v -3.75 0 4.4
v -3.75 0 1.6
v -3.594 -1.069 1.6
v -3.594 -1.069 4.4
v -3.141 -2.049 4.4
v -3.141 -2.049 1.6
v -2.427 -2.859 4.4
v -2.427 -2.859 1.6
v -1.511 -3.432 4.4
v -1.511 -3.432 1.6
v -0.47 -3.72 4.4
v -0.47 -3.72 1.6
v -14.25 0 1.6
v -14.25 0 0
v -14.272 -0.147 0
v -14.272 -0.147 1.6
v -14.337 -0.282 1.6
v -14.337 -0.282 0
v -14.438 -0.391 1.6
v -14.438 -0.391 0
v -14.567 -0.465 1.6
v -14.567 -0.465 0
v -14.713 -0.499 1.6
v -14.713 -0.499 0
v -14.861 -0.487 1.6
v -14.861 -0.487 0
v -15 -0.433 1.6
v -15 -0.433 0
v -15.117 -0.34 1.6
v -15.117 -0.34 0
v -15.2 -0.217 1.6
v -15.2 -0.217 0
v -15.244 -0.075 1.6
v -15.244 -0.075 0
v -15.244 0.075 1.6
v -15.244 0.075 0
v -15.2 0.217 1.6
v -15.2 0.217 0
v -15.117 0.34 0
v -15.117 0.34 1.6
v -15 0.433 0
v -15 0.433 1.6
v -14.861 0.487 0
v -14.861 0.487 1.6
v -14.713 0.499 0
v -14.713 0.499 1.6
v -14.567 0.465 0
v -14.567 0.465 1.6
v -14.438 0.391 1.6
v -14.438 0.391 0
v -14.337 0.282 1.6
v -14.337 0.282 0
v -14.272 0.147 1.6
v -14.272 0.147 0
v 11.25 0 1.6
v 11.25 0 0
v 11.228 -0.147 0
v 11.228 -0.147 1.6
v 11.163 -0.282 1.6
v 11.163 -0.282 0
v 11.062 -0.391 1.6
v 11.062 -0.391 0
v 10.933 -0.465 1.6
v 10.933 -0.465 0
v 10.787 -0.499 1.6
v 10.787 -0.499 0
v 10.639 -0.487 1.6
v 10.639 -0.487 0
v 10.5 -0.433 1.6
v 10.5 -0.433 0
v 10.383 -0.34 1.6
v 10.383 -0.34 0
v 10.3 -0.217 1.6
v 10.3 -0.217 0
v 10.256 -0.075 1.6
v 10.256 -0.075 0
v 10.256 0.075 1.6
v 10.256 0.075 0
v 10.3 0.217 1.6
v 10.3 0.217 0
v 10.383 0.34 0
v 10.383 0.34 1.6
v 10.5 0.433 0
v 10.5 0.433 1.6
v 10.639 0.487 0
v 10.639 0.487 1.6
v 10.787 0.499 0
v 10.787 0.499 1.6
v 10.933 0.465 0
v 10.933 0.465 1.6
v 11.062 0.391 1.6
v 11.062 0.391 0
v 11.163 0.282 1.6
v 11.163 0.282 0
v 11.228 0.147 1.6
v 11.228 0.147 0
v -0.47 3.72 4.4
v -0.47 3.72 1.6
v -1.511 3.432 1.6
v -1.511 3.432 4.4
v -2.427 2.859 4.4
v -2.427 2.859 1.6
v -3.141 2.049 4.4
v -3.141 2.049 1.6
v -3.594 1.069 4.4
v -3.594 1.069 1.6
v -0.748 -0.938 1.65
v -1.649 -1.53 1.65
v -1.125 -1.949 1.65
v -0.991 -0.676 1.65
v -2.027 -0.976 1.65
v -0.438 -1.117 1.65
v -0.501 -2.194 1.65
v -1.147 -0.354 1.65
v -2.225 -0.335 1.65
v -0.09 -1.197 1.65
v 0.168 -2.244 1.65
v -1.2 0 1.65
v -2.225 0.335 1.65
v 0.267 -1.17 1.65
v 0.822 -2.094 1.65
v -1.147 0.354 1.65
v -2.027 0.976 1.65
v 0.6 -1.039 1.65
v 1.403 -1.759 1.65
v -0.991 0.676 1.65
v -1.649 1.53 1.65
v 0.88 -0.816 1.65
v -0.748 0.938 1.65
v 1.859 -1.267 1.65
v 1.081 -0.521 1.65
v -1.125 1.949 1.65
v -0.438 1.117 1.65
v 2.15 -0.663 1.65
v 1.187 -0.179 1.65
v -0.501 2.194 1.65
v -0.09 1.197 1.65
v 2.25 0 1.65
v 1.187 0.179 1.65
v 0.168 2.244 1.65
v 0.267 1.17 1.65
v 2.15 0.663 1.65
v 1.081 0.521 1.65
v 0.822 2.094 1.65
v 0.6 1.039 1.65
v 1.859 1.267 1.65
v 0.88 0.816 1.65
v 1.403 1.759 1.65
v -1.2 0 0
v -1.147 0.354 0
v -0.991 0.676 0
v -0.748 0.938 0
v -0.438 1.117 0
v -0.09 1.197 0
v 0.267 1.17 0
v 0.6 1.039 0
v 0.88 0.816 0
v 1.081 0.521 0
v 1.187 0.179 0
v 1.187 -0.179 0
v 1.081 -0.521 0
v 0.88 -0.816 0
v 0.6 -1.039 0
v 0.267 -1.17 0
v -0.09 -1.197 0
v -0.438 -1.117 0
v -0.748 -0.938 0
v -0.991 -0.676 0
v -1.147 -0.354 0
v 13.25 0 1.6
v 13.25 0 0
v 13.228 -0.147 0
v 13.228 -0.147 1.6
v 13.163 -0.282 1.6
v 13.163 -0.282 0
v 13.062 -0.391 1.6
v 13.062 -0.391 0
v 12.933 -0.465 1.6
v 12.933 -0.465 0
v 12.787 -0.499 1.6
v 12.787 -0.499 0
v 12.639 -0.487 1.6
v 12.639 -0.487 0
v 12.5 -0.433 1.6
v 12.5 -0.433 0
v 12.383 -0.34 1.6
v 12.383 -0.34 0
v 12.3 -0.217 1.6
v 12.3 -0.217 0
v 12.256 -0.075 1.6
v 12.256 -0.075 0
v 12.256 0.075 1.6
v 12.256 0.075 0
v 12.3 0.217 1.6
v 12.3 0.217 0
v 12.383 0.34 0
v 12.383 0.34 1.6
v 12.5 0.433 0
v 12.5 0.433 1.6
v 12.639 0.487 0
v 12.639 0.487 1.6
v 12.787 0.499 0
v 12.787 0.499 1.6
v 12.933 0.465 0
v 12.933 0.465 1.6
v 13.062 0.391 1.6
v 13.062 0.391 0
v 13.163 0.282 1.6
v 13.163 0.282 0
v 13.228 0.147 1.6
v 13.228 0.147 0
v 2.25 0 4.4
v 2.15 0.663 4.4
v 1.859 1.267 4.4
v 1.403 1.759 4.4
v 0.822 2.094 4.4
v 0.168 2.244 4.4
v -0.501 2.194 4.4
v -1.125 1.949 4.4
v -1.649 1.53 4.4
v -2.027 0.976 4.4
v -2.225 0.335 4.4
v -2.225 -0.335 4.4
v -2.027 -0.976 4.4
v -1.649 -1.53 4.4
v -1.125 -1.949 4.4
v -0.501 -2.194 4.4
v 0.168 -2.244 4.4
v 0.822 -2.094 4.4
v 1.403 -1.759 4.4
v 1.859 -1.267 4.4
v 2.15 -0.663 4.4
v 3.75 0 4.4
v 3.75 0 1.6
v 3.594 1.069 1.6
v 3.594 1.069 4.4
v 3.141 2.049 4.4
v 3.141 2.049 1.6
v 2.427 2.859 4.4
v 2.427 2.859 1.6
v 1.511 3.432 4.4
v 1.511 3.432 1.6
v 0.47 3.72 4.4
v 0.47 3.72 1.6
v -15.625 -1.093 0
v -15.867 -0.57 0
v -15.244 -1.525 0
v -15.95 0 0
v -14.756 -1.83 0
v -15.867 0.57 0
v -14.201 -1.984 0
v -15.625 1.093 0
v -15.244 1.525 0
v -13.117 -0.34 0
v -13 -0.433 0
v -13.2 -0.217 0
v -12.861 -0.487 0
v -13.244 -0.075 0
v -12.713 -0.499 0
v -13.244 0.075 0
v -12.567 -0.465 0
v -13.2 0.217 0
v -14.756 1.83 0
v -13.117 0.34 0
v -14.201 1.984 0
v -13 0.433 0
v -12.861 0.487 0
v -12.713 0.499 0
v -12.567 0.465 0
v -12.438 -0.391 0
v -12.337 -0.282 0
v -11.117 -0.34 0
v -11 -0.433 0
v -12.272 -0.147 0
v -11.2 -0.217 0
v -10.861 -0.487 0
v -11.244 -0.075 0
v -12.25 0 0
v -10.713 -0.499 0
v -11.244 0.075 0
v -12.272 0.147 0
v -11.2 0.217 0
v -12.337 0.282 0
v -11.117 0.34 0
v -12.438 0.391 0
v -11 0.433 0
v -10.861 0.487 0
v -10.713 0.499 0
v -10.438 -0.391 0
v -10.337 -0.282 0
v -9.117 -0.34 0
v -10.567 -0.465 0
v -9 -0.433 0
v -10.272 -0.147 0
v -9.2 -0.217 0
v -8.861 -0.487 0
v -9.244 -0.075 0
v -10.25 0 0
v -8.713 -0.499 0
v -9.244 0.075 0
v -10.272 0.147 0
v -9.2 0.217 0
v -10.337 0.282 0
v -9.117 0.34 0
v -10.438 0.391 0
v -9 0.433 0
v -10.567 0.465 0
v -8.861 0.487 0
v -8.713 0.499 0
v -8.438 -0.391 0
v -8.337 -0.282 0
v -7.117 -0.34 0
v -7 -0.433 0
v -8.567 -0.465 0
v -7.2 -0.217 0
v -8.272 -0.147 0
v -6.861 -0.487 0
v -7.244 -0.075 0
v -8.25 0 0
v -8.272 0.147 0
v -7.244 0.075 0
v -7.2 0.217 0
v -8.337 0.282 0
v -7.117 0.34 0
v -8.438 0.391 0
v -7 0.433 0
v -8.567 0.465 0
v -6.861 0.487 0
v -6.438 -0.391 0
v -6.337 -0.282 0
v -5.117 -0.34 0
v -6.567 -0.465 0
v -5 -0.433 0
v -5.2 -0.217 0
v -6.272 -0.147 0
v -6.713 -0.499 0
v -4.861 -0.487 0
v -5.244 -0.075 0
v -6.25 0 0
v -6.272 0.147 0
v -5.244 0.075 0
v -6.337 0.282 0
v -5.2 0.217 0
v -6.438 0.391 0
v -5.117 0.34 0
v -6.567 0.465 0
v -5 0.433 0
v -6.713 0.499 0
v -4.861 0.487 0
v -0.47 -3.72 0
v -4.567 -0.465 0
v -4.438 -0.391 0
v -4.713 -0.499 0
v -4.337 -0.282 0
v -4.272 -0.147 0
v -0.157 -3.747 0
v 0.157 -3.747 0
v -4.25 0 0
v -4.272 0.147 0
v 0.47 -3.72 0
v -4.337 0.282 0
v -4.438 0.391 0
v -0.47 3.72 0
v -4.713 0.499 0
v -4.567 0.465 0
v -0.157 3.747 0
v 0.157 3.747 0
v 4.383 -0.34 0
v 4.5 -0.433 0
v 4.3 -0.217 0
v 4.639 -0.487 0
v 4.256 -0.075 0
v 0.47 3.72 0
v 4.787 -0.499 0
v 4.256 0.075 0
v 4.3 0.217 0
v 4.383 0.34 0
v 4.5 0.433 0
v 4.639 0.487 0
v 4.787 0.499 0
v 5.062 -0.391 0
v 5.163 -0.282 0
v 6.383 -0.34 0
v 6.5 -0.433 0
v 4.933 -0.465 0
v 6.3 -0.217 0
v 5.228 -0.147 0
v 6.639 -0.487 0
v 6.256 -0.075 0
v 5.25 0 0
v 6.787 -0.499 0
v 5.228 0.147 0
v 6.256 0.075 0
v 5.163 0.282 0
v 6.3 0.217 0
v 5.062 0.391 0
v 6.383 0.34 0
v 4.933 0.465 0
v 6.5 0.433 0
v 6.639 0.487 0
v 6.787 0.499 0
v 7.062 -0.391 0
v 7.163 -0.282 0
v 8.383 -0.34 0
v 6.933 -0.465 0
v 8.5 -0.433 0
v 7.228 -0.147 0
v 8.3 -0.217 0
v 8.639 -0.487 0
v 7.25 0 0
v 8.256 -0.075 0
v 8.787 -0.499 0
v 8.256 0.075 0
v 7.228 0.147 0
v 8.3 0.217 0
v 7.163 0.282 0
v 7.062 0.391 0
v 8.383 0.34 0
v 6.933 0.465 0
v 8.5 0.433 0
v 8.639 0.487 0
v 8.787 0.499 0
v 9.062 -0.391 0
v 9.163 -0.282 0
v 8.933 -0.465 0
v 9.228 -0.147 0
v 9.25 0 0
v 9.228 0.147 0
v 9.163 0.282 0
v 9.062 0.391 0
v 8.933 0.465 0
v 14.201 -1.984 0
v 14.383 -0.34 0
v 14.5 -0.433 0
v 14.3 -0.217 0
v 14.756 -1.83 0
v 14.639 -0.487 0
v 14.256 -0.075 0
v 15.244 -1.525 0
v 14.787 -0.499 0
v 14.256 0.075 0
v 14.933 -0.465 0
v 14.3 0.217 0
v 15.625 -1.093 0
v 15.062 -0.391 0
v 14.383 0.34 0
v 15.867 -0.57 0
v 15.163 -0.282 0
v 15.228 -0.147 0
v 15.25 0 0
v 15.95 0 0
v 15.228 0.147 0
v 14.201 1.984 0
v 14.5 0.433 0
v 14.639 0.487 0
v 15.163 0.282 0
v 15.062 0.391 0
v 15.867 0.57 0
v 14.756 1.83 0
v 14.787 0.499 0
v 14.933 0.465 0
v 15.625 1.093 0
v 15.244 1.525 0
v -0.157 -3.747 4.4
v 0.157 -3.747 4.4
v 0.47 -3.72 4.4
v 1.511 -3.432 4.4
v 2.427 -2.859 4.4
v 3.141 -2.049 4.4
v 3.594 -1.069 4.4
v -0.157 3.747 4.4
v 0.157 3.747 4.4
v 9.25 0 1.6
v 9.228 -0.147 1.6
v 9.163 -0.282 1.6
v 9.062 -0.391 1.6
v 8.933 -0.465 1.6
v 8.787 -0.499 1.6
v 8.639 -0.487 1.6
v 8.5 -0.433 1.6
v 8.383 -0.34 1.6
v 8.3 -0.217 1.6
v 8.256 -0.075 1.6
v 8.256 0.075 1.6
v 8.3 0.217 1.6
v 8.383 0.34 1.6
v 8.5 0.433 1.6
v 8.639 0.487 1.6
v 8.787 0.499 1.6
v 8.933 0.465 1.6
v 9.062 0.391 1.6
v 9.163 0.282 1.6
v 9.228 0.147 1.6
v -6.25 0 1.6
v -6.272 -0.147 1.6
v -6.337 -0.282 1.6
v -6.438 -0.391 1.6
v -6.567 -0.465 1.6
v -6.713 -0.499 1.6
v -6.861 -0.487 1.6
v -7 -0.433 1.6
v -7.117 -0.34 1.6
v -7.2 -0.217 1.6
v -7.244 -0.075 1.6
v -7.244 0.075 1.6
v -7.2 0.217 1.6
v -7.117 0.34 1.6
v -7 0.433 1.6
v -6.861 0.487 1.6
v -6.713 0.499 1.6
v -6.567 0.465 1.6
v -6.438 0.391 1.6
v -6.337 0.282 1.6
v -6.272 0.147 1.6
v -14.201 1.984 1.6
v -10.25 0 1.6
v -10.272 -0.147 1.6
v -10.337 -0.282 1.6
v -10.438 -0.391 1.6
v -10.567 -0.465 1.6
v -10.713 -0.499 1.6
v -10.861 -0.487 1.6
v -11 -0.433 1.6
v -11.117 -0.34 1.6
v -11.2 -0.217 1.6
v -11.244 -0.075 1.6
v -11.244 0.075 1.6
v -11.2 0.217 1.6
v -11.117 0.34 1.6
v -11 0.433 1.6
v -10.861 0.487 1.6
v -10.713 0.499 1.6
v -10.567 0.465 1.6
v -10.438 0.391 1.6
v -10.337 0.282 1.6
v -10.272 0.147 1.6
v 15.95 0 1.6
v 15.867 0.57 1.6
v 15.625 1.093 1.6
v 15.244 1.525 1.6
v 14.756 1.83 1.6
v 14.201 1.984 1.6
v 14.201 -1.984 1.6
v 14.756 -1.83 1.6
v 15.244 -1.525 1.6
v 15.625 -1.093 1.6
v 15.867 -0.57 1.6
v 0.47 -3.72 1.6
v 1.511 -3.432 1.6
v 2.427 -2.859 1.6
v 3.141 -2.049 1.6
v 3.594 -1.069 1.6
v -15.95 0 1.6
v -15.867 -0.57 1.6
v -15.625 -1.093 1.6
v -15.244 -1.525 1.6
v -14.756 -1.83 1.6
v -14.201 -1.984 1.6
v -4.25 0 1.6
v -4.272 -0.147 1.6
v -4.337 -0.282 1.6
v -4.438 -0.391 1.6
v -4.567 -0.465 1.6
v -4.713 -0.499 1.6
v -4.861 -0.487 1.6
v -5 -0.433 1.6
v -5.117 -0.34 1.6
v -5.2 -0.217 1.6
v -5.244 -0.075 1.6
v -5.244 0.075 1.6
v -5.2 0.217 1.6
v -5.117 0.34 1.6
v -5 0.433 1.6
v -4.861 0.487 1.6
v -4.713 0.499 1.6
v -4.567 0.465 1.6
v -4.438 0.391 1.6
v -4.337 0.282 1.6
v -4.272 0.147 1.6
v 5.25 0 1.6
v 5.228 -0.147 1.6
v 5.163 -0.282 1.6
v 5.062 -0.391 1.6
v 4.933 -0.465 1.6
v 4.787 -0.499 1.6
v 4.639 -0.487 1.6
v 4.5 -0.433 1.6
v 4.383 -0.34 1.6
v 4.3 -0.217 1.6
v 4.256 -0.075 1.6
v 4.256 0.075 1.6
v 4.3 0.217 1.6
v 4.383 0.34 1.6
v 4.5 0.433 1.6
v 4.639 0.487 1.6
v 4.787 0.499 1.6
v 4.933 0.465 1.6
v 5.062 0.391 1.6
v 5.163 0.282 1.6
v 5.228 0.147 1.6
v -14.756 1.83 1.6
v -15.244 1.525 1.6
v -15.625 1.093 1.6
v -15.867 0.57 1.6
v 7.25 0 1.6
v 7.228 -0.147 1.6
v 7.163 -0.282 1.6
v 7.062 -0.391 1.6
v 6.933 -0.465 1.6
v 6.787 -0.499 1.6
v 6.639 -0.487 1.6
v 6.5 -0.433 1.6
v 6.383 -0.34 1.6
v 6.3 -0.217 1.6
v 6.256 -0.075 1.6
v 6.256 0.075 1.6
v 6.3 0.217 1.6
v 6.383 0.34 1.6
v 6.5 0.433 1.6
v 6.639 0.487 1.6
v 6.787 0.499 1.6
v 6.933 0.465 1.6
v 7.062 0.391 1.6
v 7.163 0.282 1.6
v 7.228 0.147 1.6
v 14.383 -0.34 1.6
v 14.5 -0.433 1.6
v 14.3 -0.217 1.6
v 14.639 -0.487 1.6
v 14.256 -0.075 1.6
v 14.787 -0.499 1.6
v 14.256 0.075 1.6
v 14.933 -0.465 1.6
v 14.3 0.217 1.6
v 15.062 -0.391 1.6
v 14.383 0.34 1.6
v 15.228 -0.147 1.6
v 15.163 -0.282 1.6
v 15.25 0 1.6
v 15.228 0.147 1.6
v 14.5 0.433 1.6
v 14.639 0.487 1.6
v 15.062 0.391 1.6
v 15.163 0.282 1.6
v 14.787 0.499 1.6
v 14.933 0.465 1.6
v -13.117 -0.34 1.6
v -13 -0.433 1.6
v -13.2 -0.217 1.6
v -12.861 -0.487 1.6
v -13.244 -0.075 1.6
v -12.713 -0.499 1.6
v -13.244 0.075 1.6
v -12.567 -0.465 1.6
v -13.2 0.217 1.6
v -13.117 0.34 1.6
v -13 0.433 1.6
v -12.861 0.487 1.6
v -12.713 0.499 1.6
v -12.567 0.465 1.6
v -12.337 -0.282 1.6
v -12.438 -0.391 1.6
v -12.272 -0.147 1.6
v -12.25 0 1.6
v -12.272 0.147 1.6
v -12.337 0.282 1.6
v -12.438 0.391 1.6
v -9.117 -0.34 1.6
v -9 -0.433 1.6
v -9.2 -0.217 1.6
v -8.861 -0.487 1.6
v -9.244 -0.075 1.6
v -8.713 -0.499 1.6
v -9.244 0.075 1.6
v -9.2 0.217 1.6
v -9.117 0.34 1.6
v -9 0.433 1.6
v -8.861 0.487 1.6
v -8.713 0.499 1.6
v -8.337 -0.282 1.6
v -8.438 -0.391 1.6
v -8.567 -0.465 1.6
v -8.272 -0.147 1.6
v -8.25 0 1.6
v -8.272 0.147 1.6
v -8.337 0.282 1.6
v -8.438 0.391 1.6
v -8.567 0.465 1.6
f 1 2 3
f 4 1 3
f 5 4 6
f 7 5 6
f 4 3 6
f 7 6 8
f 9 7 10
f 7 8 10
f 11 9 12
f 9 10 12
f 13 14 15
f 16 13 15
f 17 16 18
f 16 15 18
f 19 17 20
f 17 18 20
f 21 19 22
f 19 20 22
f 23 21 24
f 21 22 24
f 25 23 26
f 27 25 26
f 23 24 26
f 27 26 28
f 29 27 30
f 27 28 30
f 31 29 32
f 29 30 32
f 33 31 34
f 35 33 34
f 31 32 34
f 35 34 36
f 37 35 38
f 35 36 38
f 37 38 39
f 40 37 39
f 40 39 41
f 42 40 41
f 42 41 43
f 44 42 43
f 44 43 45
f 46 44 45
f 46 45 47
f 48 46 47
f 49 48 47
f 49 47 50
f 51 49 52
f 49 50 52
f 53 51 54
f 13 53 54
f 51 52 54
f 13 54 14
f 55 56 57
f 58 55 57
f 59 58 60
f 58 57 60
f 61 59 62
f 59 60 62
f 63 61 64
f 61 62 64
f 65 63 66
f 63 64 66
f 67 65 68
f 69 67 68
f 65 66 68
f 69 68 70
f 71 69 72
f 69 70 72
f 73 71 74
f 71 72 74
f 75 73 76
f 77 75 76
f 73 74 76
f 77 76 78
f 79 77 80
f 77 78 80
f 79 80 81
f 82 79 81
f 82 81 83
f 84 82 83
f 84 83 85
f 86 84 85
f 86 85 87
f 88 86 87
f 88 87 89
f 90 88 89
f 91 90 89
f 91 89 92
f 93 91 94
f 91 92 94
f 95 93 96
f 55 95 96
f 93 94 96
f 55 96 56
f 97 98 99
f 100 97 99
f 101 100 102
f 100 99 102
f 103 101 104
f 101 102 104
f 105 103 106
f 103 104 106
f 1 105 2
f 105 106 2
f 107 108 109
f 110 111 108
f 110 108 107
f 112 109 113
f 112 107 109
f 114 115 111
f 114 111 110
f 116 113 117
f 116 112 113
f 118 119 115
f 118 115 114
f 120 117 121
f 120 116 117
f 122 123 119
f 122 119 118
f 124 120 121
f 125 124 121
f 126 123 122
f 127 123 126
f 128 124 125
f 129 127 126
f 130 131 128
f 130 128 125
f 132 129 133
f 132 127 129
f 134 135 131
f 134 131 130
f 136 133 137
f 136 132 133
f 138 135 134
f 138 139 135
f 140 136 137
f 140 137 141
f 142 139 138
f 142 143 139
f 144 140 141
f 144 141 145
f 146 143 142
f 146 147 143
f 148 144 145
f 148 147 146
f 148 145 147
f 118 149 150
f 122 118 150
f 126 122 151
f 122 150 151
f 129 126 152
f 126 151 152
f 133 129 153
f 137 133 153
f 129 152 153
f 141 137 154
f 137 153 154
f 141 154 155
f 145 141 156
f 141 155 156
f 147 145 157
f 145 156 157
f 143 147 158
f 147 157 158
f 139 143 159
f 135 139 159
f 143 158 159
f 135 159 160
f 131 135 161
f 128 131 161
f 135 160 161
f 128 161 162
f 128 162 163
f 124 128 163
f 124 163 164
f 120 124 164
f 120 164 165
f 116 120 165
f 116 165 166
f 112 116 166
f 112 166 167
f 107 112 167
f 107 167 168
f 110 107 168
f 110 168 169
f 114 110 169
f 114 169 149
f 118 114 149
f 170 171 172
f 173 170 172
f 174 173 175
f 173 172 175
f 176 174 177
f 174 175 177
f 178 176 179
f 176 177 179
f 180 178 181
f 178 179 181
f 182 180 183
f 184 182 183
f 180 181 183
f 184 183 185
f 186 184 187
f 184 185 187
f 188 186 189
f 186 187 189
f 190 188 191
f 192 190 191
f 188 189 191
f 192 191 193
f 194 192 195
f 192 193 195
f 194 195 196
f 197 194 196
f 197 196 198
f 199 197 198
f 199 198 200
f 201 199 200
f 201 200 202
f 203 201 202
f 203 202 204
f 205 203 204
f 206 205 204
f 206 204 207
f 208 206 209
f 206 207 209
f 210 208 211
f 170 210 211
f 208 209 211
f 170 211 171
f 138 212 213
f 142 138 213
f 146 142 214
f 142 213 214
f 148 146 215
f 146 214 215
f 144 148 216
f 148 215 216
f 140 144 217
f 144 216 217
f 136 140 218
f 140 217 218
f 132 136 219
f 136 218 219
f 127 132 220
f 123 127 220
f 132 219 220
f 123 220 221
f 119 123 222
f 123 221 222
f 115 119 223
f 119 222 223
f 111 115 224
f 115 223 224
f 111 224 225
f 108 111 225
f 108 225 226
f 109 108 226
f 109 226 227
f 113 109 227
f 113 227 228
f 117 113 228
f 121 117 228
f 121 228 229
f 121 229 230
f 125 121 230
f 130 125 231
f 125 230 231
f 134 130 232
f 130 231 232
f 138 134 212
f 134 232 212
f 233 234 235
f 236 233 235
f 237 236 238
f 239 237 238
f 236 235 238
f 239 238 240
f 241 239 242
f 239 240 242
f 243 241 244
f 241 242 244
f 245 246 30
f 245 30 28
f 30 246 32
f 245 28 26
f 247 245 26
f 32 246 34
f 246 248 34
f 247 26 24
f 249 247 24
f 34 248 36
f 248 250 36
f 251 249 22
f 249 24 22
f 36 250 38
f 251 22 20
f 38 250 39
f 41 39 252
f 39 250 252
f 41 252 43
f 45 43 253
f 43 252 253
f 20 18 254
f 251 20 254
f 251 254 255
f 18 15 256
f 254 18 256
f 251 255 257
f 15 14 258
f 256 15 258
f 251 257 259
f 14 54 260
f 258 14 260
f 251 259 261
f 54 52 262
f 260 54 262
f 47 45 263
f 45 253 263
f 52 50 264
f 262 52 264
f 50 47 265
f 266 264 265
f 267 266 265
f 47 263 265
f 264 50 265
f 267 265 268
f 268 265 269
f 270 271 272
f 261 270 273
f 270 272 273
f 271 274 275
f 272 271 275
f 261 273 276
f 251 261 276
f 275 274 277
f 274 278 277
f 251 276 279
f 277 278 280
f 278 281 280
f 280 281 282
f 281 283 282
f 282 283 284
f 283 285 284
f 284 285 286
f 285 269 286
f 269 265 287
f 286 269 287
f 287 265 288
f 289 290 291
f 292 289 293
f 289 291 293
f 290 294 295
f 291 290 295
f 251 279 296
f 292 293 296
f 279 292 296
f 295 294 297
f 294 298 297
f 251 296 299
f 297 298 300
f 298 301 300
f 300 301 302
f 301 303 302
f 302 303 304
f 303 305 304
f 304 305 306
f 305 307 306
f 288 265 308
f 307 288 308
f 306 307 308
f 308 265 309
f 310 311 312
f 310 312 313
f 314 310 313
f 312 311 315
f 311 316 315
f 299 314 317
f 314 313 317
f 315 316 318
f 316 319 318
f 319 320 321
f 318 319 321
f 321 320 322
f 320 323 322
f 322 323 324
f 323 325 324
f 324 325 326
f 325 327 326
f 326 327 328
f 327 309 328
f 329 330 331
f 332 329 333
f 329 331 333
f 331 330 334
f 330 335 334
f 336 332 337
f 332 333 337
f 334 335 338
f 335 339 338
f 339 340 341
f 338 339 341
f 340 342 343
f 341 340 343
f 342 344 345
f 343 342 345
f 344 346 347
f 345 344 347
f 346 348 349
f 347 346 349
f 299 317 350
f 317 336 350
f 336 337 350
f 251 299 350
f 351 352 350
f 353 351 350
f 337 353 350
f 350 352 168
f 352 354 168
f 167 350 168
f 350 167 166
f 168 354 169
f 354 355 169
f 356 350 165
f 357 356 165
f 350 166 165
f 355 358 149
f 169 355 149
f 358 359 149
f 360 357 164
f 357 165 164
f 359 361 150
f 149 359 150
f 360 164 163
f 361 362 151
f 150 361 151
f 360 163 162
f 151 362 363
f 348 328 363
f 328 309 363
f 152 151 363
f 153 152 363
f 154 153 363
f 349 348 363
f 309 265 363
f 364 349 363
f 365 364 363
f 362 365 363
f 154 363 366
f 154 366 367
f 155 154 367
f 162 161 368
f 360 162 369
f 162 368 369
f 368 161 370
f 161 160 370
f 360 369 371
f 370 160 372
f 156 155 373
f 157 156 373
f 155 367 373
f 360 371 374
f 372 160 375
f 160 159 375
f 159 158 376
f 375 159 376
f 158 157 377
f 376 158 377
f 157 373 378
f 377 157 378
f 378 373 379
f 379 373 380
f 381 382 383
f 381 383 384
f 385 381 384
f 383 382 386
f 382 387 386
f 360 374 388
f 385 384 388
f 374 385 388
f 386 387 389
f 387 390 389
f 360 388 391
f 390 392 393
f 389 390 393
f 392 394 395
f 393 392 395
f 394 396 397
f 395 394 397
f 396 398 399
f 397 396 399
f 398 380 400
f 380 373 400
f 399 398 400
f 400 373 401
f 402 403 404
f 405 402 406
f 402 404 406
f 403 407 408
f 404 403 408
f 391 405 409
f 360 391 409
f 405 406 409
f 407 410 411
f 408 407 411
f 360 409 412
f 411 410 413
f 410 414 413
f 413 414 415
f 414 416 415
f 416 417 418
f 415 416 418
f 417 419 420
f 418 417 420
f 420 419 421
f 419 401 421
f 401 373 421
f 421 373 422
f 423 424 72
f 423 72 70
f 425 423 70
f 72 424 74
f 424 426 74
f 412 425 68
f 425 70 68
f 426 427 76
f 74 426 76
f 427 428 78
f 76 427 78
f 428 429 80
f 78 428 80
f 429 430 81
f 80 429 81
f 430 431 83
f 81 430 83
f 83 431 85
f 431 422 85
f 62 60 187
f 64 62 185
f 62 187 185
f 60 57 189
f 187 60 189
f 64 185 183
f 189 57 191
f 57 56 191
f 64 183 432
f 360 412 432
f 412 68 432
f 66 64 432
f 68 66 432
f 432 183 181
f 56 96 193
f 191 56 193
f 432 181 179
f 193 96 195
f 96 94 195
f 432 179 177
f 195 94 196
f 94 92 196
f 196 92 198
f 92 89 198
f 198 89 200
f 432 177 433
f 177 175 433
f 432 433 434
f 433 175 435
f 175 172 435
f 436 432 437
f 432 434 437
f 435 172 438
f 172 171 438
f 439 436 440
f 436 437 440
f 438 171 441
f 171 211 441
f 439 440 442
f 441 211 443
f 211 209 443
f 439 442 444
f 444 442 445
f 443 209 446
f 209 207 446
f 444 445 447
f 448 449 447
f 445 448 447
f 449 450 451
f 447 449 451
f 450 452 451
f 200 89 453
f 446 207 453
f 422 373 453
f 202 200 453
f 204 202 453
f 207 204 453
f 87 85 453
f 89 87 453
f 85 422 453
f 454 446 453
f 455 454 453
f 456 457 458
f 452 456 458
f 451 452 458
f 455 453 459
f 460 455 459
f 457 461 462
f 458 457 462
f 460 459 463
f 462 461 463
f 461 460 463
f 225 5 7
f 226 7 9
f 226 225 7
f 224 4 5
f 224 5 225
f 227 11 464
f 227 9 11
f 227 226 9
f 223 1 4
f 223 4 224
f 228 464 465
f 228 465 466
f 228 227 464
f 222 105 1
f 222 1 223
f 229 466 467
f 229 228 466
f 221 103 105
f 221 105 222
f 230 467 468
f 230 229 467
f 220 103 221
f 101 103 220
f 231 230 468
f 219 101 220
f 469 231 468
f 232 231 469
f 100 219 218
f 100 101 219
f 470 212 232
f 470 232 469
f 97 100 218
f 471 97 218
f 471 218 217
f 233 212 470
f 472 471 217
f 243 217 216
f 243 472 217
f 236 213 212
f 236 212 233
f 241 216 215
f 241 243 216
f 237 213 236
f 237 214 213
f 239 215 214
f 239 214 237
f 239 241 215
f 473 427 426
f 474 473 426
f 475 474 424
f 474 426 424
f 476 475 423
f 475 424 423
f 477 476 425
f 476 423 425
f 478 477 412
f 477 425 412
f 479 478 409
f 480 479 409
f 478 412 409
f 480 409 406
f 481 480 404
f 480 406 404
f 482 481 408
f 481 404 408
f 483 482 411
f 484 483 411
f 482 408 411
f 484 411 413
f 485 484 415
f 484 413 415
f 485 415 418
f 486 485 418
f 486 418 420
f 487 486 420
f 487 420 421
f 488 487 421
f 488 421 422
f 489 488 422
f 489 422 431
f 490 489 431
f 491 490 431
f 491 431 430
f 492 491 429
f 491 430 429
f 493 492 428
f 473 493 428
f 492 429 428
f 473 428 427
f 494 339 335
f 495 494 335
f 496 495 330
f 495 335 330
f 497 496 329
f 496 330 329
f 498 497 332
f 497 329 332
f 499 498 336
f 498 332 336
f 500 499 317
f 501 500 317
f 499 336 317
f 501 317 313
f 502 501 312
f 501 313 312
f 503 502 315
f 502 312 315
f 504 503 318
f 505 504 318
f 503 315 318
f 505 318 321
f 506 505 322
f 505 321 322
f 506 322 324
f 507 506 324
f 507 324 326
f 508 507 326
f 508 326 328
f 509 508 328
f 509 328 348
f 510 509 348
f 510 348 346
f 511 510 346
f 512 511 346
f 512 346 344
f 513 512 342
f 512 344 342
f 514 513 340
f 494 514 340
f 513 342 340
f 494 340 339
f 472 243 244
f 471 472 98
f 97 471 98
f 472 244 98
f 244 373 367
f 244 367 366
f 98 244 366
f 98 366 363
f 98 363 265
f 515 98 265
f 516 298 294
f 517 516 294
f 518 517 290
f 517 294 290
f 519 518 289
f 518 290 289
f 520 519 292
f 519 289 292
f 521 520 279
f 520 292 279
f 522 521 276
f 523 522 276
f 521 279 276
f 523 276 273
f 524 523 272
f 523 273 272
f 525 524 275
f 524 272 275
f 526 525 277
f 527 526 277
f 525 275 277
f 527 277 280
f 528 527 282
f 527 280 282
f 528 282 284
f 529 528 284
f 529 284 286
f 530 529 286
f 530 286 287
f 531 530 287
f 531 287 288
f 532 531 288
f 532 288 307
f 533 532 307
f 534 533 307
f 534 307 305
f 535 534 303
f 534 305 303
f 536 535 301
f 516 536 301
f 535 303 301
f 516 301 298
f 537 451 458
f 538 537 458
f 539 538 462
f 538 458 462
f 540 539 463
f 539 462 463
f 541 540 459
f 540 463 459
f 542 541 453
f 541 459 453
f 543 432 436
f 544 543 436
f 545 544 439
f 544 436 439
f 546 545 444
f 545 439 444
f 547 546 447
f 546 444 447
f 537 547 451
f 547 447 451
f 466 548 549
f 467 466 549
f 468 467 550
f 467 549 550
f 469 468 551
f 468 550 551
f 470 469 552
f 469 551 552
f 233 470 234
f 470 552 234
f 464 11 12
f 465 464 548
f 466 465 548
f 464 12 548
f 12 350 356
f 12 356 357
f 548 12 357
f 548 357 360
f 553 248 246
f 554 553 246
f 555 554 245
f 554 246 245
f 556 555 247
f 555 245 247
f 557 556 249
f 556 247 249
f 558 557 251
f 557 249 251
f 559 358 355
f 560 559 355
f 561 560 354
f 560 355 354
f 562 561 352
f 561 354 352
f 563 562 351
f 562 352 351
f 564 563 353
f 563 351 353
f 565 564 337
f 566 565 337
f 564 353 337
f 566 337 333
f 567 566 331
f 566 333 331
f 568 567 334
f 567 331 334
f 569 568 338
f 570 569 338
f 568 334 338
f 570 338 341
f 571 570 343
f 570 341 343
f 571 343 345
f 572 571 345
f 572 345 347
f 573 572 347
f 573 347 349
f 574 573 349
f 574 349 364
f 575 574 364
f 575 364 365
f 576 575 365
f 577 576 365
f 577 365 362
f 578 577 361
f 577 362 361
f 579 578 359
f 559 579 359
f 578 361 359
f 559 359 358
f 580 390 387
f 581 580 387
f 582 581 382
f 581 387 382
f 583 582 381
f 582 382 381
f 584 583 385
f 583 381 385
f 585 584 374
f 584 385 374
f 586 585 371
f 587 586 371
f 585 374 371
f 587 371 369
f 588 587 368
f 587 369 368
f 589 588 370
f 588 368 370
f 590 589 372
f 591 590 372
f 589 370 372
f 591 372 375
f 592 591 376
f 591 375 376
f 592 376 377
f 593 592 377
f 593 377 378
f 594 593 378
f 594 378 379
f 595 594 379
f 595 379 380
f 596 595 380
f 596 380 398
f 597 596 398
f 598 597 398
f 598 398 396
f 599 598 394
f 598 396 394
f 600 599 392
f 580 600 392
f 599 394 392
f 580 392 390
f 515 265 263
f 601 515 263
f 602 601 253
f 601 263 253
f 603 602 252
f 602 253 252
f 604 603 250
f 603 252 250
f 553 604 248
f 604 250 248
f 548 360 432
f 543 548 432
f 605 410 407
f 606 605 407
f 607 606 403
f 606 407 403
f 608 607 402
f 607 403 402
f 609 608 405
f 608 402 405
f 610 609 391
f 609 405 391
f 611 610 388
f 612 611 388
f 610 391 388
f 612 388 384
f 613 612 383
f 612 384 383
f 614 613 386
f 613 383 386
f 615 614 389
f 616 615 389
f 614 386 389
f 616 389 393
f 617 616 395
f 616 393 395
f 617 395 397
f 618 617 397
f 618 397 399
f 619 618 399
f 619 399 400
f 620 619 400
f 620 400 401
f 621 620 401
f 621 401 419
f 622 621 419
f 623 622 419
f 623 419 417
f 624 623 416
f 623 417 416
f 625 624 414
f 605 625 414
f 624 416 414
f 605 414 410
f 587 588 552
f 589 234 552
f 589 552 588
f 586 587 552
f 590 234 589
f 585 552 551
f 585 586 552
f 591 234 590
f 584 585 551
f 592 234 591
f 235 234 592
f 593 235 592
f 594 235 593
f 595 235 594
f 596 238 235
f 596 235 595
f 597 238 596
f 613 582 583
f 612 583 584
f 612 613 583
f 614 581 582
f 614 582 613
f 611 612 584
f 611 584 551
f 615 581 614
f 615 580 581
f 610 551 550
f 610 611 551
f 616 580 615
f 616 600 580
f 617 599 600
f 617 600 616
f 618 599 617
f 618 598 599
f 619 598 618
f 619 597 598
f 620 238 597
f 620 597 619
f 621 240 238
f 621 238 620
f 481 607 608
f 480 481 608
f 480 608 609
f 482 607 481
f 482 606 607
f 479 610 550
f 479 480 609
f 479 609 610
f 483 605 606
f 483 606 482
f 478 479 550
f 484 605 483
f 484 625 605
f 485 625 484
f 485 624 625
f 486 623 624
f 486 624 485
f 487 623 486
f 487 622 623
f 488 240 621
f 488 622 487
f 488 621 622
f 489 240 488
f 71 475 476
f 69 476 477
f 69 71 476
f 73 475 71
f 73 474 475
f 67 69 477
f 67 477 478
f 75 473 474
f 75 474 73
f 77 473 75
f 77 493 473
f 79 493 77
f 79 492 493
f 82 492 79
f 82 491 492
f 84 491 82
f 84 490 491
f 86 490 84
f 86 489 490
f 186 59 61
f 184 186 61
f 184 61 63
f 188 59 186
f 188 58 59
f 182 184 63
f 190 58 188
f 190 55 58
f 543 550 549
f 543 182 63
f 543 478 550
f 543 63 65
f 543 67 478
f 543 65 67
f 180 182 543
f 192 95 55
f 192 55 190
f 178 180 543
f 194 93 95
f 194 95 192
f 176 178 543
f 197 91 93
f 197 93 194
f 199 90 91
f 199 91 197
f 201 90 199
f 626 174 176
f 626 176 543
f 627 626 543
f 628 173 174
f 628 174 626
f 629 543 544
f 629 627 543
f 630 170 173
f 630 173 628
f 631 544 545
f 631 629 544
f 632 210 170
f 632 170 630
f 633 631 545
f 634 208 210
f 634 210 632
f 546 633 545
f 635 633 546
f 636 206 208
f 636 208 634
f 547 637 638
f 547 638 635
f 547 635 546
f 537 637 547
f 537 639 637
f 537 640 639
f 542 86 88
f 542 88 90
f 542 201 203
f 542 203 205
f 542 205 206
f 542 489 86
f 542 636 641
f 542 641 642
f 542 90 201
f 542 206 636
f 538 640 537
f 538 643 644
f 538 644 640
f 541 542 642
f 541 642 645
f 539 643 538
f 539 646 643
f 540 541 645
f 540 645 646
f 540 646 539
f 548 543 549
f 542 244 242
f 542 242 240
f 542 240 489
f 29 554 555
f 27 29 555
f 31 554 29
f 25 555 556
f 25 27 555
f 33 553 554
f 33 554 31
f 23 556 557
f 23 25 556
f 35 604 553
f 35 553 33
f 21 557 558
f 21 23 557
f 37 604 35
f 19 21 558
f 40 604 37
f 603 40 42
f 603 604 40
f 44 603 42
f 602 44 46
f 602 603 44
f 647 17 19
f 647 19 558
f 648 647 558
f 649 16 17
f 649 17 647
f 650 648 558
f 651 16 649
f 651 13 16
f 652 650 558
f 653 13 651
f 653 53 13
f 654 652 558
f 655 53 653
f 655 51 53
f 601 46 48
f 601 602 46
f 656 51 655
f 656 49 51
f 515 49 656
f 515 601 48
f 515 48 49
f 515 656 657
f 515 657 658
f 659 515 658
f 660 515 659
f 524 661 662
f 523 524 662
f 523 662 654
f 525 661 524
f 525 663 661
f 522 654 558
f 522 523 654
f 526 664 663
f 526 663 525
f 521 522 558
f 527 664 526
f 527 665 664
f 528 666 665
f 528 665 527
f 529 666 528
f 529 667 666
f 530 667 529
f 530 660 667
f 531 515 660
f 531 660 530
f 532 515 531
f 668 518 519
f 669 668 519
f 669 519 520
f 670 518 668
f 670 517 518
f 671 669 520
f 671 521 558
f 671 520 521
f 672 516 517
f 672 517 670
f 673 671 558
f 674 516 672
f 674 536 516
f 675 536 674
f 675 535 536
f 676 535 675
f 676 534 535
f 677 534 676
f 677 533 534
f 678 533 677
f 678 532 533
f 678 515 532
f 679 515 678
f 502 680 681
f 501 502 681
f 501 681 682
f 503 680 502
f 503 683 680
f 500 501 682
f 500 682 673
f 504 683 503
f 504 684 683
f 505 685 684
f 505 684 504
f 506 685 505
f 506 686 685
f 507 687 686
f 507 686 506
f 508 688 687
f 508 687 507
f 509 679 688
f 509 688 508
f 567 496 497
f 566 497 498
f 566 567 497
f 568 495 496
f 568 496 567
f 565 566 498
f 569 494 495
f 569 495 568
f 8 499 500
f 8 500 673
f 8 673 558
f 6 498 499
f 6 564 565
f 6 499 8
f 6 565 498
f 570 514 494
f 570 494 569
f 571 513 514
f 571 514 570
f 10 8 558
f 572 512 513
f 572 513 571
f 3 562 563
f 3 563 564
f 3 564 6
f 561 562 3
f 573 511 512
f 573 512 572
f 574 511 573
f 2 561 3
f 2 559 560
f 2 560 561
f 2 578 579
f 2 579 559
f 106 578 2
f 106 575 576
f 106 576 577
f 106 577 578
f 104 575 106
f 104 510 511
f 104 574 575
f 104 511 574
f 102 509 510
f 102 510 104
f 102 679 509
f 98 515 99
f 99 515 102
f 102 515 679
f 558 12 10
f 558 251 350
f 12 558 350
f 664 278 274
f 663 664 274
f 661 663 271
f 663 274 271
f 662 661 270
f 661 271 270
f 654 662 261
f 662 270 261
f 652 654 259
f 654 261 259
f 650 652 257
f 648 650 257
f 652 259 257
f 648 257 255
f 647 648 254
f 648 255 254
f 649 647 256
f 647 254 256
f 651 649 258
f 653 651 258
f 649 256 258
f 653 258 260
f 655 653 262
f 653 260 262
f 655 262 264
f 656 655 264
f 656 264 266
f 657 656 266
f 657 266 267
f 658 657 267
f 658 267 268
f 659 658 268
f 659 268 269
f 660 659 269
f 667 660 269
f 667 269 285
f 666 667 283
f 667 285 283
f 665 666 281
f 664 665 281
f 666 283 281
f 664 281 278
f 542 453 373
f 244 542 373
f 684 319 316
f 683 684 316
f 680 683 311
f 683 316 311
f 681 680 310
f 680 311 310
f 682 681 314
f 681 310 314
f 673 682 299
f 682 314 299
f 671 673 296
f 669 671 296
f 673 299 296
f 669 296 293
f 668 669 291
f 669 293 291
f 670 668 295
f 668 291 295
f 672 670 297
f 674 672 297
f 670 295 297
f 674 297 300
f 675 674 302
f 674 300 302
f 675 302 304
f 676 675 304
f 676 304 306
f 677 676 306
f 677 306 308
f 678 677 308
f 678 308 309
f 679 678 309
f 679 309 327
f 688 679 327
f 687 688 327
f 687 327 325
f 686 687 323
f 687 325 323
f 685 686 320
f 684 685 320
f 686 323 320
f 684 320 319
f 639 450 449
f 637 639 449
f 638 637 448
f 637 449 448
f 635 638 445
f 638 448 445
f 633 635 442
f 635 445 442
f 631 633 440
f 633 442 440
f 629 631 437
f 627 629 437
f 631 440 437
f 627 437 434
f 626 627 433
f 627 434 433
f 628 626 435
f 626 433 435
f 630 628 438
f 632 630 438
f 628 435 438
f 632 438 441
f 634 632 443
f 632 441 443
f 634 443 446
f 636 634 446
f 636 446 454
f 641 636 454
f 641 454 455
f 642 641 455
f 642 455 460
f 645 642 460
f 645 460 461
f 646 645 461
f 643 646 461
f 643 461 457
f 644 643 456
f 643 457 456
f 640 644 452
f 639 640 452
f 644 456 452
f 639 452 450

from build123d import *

# Parameters (mm, degrees)
SKETCH1_R             = 0.5
BOSS_EXTRUDE1_DEPTH   = 1.6
BOSS_EXTRUDE1_2_DEPTH = 1.6
SKETCH1_4_R           = 3.75
SKETCH1_4_R_2         = 1.2
BOSS_EXTRUDE2_DEPTH   = 4.4
SKETCH2_R             = 2.25
CUT_EXTRUDE1_DEPTH    = 2.75


with BuildPart() as part:
    # Sketch1 → Boss-Extrude1 (new body)
    with BuildSketch(Plane.XY):
        with BuildLine():
            ThreePointArc((0.470430108, 3.720375722), (3.75, 0), (0.470430108, -3.720375722))
            Line((0.470430108, -3.720375722), (14.200896057, -1.984200385))
            ThreePointArc((14.200896057, -1.984200385), (15.95, 0), (14.200896057, 1.984200385))
            Line((14.200896057, 1.984200385), (0.470430108, 3.720375722))
        make_face()
        with Locations((14.75, 0)):
            Circle(SKETCH1_R, mode=Mode.SUBTRACT)
        with Locations((12.75, 0)):
            Circle(SKETCH1_R, mode=Mode.SUBTRACT)
        with Locations((10.75, 0)):
            Circle(SKETCH1_R, mode=Mode.SUBTRACT)
        with Locations((8.75, 0)):
            Circle(SKETCH1_R, mode=Mode.SUBTRACT)
        with Locations((6.75, 0)):
            Circle(SKETCH1_R, mode=Mode.SUBTRACT)
        with Locations((4.75, 0)):
            Circle(SKETCH1_R, mode=Mode.SUBTRACT)
    extrude(amount=BOSS_EXTRUDE1_DEPTH)



with BuildPart() as body_2:
    # Sketch1 → Boss-Extrude1 2 (new body)
    with BuildSketch(Plane.XY):
        with BuildLine():
            ThreePointArc((-0.470430108, -3.720375722), (-3.75, 0), (-0.470430108, 3.720375722))
            Line((-0.470430108, 3.720375722), (-14.200896057, 1.984200385))
            ThreePointArc((-14.200896057, 1.984200385), (-15.95, 0), (-14.200896057, -1.984200385))
            Line((-14.200896057, -1.984200385), (-0.470430108, -3.720375722))
        make_face()
        with Locations((-14.75, 0)):
            Circle(SKETCH1_R, mode=Mode.SUBTRACT)
        with Locations((-12.75, 0)):
            Circle(SKETCH1_R, mode=Mode.SUBTRACT)
        with Locations((-10.75, 0)):
            Circle(SKETCH1_R, mode=Mode.SUBTRACT)
        with Locations((-8.75, 0)):
            Circle(SKETCH1_R, mode=Mode.SUBTRACT)
        with Locations((-6.75, 0)):
            Circle(SKETCH1_R, mode=Mode.SUBTRACT)
        with Locations((-4.75, 0)):
            Circle(SKETCH1_R, mode=Mode.SUBTRACT)
    extrude(amount=BOSS_EXTRUDE1_2_DEPTH)


with BuildPart() as part_1:
    add(part.part)

    add(body_2.part)  # Boss-Extrude2 merges body 2
    # Sketch1<4> → Boss-Extrude2 (add)
    with BuildSketch(Plane.XY):
        Circle(SKETCH1_4_R)
        Circle(SKETCH1_4_R_2, mode=Mode.SUBTRACT)
    extrude(amount=BOSS_EXTRUDE2_DEPTH)

    # Sketch2 → Cut-Extrude1 (cut)
    with BuildSketch(Plane.XY.offset(4.4)):
        Circle(SKETCH2_R)
    extrude(amount=-CUT_EXTRUDE1_DEPTH, mode=Mode.SUBTRACT)


solid = part_1.part
